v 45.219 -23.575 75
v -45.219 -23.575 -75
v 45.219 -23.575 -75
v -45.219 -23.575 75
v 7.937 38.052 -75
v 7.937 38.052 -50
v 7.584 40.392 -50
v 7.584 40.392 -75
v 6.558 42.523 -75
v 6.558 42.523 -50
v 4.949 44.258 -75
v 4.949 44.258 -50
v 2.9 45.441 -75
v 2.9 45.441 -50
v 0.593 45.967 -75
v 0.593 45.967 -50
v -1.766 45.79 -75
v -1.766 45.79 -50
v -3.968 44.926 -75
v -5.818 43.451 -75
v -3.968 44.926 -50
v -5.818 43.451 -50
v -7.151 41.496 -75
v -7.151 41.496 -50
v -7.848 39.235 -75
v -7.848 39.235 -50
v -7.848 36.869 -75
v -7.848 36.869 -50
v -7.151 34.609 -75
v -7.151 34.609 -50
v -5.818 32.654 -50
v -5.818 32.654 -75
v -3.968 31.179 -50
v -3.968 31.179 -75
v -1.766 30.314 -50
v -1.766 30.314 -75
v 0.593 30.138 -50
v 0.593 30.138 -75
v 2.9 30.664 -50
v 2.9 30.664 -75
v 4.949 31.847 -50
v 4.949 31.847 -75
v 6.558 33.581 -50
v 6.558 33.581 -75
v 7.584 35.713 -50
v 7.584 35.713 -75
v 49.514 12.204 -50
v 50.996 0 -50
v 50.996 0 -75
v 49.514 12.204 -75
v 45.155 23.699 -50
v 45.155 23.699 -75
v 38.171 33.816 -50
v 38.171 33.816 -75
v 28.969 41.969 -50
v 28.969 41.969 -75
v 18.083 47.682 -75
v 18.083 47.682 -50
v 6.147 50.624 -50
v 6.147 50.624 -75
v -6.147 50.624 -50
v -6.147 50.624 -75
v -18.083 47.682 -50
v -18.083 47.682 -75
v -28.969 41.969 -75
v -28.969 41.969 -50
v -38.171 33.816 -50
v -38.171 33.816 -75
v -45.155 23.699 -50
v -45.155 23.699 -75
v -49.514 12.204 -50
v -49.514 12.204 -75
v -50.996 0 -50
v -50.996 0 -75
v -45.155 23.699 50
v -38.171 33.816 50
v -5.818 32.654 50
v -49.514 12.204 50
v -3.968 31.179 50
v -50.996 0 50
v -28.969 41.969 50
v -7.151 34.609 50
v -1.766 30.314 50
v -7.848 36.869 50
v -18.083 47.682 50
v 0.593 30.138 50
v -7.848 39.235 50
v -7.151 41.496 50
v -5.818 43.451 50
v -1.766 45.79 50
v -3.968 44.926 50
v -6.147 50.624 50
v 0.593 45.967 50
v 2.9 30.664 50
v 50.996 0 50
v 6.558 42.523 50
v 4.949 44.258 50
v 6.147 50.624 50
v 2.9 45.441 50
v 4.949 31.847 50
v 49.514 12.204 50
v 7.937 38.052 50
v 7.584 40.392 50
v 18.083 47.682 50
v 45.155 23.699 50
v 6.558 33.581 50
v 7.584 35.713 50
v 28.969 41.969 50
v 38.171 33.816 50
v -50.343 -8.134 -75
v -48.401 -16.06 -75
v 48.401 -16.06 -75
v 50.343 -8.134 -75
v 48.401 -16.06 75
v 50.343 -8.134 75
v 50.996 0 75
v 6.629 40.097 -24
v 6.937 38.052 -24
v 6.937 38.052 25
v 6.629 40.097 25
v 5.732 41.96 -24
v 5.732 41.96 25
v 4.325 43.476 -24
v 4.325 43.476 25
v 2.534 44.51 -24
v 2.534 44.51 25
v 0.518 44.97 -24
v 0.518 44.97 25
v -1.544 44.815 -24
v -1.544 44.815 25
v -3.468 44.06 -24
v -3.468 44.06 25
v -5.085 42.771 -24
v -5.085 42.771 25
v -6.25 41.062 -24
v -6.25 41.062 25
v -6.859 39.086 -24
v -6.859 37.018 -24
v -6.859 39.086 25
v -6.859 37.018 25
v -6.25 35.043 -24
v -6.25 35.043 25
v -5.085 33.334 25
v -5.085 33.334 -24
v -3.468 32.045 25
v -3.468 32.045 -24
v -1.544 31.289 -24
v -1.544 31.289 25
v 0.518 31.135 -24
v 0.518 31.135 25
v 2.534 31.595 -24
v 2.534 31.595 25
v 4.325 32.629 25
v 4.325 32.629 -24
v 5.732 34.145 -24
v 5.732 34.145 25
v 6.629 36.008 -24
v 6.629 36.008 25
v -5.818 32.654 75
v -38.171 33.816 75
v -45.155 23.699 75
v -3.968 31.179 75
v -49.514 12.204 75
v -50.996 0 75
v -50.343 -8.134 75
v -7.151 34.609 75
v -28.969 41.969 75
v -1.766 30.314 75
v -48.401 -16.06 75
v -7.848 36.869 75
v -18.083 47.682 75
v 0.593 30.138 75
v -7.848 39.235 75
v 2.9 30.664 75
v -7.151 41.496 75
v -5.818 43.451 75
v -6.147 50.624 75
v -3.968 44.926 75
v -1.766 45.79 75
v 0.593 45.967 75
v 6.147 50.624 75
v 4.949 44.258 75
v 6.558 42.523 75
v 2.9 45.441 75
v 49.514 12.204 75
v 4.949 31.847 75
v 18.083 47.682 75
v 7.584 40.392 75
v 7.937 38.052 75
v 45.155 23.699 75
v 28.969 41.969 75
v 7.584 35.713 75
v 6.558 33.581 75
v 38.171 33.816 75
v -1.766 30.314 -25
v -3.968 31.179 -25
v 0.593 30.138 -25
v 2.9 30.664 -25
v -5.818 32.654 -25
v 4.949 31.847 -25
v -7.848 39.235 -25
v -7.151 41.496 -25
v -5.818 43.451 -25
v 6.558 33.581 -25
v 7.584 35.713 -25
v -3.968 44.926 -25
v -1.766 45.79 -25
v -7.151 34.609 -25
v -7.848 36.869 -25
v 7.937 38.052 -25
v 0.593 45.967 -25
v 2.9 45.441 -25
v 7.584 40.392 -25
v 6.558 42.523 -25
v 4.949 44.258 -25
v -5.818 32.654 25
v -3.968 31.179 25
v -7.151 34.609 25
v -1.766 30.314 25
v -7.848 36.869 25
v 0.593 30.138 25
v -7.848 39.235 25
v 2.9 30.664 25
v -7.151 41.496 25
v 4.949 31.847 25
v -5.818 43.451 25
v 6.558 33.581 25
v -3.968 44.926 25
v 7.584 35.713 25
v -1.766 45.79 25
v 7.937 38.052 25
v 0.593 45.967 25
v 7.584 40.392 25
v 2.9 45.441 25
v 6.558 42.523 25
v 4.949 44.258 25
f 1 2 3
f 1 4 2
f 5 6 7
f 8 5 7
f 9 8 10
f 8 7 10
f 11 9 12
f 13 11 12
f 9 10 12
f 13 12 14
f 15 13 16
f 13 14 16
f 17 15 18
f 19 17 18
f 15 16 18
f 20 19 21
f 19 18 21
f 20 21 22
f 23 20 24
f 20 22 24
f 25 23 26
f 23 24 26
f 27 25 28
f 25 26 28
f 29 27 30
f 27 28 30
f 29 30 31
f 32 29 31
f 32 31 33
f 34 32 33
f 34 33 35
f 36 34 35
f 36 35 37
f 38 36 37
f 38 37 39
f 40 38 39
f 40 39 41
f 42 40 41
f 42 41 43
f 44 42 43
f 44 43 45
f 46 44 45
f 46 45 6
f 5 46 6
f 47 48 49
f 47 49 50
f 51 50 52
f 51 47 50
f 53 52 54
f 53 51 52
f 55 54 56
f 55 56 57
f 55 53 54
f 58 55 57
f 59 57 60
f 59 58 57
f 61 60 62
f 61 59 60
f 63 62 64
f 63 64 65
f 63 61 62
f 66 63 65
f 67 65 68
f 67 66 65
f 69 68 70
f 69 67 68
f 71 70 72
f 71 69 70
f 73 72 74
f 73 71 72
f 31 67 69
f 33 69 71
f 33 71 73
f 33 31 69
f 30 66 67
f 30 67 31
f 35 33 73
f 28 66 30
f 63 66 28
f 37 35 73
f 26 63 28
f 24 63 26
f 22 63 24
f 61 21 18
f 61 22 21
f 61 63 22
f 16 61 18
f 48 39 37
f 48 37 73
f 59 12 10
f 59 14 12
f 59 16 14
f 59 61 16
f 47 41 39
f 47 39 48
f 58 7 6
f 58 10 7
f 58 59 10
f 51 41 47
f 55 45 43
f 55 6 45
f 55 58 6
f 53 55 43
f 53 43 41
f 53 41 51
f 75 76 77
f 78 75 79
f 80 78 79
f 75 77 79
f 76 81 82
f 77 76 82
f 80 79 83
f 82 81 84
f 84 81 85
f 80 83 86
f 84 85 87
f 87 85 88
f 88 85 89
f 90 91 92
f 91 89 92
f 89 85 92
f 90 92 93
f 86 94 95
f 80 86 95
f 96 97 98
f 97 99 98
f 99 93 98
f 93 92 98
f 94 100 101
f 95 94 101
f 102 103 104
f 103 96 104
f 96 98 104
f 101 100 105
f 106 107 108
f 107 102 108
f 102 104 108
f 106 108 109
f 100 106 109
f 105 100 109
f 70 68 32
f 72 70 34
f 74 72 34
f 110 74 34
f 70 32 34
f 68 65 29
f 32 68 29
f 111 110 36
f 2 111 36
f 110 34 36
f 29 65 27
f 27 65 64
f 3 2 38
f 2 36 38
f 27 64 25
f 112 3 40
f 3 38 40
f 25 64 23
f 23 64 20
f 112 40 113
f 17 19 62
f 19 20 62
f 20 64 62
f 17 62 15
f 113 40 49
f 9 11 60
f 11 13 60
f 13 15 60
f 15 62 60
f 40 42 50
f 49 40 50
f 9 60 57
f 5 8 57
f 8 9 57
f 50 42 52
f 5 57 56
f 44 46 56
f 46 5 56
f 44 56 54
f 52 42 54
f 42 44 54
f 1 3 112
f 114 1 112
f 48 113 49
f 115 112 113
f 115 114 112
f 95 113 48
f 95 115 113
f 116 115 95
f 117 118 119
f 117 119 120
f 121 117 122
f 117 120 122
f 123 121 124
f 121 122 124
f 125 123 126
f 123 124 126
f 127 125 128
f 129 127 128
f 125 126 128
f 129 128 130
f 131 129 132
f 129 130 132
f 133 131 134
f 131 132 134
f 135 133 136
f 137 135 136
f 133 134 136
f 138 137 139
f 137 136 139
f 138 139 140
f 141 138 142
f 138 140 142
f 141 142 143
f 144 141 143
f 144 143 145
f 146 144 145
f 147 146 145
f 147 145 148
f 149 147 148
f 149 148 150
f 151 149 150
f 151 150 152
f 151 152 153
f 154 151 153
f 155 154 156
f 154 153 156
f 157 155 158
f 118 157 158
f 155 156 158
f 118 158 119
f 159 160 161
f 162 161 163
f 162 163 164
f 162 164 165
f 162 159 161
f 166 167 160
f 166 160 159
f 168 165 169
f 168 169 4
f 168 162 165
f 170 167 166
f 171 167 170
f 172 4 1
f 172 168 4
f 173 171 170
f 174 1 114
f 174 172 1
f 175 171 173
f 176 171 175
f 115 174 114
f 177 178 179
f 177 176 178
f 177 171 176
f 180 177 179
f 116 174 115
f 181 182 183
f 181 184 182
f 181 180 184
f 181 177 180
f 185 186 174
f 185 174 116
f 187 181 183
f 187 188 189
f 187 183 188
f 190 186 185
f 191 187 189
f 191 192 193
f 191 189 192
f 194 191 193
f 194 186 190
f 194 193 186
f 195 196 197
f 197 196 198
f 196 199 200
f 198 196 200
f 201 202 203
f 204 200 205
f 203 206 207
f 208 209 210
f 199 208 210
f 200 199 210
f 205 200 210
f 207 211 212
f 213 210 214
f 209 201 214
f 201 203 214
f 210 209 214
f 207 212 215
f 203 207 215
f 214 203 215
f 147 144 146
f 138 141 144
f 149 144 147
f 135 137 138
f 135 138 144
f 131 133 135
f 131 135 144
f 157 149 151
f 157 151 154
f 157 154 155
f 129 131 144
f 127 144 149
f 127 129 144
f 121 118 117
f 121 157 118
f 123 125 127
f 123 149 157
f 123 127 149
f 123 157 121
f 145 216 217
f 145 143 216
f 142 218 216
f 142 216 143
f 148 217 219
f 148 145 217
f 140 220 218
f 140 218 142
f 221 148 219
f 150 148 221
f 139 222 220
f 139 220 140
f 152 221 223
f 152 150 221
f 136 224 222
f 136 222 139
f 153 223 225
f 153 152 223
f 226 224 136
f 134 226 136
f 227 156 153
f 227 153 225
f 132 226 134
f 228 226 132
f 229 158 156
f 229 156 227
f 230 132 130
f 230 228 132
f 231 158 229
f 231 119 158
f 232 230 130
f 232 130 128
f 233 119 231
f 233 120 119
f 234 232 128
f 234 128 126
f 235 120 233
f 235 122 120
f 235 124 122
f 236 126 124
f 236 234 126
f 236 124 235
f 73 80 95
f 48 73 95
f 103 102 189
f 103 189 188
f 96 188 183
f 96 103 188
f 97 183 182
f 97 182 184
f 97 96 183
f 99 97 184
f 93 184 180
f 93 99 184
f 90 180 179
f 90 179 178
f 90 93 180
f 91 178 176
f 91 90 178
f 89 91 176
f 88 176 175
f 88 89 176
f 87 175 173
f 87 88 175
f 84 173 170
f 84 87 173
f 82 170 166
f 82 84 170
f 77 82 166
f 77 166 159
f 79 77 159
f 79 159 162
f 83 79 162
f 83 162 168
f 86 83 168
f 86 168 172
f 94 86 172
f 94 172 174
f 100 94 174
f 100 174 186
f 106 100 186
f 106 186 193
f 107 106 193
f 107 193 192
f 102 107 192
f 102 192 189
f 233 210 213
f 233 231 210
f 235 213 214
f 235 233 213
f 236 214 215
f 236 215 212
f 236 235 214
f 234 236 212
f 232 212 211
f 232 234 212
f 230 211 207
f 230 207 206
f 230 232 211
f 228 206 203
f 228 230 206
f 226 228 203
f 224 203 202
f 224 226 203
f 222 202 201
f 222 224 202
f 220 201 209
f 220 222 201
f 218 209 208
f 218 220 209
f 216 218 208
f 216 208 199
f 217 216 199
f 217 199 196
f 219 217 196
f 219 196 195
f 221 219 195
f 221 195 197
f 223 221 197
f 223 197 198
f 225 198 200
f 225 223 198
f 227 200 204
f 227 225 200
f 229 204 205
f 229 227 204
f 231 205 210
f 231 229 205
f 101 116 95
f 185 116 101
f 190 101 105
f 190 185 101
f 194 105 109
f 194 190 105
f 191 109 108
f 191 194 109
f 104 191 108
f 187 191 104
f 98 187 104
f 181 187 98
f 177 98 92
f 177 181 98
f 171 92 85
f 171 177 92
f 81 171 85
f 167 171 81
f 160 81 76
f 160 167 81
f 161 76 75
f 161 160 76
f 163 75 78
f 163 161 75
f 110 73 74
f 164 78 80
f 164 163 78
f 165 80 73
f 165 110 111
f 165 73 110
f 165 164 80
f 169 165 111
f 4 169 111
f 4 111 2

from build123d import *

# Parameters (mm, degrees)
F0_R          = 7.9369782362
F1_DEPTH      = 75
F1_DEPTH_BACK = 75
F2_DEPTH      = 75
F2_DEPTH_BACK = 75
F3_DEPTH      = 50
F3_DEPTH_BACK = 50
F4_DEPTH      = 25
F4_DEPTH_BACK = 25
F5_T          = -1


with BuildPart() as f1:
    # F0 (on Top) → F1 (new body, two sides)
    with BuildSketch(Plane.XY) as f1_sk:
        with BuildLine():
            Line((-50.9958260273, 0), (50.9958260273, 0))
            ThreePointArc((50.9958260273, 0), (0, 50.9958260273), (-50.9958260273, 0))
        make_face()
        with Locations((0, 38.052380085)):
            Circle(F0_R, mode=Mode.SUBTRACT)
    extrude(amount=F1_DEPTH)
    extrude(f1_sk.sketch, amount=-F1_DEPTH_BACK)

    # F0 (on Top) → F2 (join, two sides)
    with BuildSketch(Plane.XY) as f2_sk:
        with BuildLine():
            Line((0, -23.5751420259), (45.2193205462, -23.5751420259))
            ThreePointArc((45.2193205462, -23.5751420259), (49.5306514991, -12.1362611326), (50.9958260273, 0))
            Line((50.9958260273, 0), (-50.9958260273, 0))
            ThreePointArc((-50.9958260273, 0), (-49.5306514991, -12.1362611326), (-45.2193205462, -23.5751420259))
            Line((-45.2193205462, -23.5751420259), (0, -23.5751420259))
        make_face()
    extrude(amount=F2_DEPTH)
    extrude(f2_sk.sketch, amount=-F2_DEPTH_BACK)

    # F0 (on Top) → F3 (cut, two sides)
    with BuildSketch(Plane.XY) as f3_sk:
        with BuildLine():
            Line((-50.9958260273, 0), (50.9958260273, 0))
            ThreePointArc((50.9958260273, 0), (0, 50.9958260273), (-50.9958260273, 0))
        make_face()
        with Locations((0, 38.052380085)):
            Circle(F0_R, mode=Mode.SUBTRACT)
    extrude(amount=-F3_DEPTH, mode=Mode.SUBTRACT)
    extrude(f3_sk.sketch, amount=F3_DEPTH_BACK, mode=Mode.SUBTRACT)


with BuildPart() as f4:
    # F0 (on Top) → F4 (new body, two sides)
    with BuildSketch(Plane.XY) as f4_sk:
        with Locations((0, 38.052380085)):
            Circle(F0_R)
    extrude(amount=F4_DEPTH)
    extrude(f4_sk.sketch, amount=-F4_DEPTH_BACK)

    # F5
    f5_openings = [f4.faces().sort_by_distance(p)[0] for p in [
        (0, 38.05238, 25),
    ]]
    offset(amount=F5_T, openings=f5_openings)


solid = Compound([f1.part, f4.part])
